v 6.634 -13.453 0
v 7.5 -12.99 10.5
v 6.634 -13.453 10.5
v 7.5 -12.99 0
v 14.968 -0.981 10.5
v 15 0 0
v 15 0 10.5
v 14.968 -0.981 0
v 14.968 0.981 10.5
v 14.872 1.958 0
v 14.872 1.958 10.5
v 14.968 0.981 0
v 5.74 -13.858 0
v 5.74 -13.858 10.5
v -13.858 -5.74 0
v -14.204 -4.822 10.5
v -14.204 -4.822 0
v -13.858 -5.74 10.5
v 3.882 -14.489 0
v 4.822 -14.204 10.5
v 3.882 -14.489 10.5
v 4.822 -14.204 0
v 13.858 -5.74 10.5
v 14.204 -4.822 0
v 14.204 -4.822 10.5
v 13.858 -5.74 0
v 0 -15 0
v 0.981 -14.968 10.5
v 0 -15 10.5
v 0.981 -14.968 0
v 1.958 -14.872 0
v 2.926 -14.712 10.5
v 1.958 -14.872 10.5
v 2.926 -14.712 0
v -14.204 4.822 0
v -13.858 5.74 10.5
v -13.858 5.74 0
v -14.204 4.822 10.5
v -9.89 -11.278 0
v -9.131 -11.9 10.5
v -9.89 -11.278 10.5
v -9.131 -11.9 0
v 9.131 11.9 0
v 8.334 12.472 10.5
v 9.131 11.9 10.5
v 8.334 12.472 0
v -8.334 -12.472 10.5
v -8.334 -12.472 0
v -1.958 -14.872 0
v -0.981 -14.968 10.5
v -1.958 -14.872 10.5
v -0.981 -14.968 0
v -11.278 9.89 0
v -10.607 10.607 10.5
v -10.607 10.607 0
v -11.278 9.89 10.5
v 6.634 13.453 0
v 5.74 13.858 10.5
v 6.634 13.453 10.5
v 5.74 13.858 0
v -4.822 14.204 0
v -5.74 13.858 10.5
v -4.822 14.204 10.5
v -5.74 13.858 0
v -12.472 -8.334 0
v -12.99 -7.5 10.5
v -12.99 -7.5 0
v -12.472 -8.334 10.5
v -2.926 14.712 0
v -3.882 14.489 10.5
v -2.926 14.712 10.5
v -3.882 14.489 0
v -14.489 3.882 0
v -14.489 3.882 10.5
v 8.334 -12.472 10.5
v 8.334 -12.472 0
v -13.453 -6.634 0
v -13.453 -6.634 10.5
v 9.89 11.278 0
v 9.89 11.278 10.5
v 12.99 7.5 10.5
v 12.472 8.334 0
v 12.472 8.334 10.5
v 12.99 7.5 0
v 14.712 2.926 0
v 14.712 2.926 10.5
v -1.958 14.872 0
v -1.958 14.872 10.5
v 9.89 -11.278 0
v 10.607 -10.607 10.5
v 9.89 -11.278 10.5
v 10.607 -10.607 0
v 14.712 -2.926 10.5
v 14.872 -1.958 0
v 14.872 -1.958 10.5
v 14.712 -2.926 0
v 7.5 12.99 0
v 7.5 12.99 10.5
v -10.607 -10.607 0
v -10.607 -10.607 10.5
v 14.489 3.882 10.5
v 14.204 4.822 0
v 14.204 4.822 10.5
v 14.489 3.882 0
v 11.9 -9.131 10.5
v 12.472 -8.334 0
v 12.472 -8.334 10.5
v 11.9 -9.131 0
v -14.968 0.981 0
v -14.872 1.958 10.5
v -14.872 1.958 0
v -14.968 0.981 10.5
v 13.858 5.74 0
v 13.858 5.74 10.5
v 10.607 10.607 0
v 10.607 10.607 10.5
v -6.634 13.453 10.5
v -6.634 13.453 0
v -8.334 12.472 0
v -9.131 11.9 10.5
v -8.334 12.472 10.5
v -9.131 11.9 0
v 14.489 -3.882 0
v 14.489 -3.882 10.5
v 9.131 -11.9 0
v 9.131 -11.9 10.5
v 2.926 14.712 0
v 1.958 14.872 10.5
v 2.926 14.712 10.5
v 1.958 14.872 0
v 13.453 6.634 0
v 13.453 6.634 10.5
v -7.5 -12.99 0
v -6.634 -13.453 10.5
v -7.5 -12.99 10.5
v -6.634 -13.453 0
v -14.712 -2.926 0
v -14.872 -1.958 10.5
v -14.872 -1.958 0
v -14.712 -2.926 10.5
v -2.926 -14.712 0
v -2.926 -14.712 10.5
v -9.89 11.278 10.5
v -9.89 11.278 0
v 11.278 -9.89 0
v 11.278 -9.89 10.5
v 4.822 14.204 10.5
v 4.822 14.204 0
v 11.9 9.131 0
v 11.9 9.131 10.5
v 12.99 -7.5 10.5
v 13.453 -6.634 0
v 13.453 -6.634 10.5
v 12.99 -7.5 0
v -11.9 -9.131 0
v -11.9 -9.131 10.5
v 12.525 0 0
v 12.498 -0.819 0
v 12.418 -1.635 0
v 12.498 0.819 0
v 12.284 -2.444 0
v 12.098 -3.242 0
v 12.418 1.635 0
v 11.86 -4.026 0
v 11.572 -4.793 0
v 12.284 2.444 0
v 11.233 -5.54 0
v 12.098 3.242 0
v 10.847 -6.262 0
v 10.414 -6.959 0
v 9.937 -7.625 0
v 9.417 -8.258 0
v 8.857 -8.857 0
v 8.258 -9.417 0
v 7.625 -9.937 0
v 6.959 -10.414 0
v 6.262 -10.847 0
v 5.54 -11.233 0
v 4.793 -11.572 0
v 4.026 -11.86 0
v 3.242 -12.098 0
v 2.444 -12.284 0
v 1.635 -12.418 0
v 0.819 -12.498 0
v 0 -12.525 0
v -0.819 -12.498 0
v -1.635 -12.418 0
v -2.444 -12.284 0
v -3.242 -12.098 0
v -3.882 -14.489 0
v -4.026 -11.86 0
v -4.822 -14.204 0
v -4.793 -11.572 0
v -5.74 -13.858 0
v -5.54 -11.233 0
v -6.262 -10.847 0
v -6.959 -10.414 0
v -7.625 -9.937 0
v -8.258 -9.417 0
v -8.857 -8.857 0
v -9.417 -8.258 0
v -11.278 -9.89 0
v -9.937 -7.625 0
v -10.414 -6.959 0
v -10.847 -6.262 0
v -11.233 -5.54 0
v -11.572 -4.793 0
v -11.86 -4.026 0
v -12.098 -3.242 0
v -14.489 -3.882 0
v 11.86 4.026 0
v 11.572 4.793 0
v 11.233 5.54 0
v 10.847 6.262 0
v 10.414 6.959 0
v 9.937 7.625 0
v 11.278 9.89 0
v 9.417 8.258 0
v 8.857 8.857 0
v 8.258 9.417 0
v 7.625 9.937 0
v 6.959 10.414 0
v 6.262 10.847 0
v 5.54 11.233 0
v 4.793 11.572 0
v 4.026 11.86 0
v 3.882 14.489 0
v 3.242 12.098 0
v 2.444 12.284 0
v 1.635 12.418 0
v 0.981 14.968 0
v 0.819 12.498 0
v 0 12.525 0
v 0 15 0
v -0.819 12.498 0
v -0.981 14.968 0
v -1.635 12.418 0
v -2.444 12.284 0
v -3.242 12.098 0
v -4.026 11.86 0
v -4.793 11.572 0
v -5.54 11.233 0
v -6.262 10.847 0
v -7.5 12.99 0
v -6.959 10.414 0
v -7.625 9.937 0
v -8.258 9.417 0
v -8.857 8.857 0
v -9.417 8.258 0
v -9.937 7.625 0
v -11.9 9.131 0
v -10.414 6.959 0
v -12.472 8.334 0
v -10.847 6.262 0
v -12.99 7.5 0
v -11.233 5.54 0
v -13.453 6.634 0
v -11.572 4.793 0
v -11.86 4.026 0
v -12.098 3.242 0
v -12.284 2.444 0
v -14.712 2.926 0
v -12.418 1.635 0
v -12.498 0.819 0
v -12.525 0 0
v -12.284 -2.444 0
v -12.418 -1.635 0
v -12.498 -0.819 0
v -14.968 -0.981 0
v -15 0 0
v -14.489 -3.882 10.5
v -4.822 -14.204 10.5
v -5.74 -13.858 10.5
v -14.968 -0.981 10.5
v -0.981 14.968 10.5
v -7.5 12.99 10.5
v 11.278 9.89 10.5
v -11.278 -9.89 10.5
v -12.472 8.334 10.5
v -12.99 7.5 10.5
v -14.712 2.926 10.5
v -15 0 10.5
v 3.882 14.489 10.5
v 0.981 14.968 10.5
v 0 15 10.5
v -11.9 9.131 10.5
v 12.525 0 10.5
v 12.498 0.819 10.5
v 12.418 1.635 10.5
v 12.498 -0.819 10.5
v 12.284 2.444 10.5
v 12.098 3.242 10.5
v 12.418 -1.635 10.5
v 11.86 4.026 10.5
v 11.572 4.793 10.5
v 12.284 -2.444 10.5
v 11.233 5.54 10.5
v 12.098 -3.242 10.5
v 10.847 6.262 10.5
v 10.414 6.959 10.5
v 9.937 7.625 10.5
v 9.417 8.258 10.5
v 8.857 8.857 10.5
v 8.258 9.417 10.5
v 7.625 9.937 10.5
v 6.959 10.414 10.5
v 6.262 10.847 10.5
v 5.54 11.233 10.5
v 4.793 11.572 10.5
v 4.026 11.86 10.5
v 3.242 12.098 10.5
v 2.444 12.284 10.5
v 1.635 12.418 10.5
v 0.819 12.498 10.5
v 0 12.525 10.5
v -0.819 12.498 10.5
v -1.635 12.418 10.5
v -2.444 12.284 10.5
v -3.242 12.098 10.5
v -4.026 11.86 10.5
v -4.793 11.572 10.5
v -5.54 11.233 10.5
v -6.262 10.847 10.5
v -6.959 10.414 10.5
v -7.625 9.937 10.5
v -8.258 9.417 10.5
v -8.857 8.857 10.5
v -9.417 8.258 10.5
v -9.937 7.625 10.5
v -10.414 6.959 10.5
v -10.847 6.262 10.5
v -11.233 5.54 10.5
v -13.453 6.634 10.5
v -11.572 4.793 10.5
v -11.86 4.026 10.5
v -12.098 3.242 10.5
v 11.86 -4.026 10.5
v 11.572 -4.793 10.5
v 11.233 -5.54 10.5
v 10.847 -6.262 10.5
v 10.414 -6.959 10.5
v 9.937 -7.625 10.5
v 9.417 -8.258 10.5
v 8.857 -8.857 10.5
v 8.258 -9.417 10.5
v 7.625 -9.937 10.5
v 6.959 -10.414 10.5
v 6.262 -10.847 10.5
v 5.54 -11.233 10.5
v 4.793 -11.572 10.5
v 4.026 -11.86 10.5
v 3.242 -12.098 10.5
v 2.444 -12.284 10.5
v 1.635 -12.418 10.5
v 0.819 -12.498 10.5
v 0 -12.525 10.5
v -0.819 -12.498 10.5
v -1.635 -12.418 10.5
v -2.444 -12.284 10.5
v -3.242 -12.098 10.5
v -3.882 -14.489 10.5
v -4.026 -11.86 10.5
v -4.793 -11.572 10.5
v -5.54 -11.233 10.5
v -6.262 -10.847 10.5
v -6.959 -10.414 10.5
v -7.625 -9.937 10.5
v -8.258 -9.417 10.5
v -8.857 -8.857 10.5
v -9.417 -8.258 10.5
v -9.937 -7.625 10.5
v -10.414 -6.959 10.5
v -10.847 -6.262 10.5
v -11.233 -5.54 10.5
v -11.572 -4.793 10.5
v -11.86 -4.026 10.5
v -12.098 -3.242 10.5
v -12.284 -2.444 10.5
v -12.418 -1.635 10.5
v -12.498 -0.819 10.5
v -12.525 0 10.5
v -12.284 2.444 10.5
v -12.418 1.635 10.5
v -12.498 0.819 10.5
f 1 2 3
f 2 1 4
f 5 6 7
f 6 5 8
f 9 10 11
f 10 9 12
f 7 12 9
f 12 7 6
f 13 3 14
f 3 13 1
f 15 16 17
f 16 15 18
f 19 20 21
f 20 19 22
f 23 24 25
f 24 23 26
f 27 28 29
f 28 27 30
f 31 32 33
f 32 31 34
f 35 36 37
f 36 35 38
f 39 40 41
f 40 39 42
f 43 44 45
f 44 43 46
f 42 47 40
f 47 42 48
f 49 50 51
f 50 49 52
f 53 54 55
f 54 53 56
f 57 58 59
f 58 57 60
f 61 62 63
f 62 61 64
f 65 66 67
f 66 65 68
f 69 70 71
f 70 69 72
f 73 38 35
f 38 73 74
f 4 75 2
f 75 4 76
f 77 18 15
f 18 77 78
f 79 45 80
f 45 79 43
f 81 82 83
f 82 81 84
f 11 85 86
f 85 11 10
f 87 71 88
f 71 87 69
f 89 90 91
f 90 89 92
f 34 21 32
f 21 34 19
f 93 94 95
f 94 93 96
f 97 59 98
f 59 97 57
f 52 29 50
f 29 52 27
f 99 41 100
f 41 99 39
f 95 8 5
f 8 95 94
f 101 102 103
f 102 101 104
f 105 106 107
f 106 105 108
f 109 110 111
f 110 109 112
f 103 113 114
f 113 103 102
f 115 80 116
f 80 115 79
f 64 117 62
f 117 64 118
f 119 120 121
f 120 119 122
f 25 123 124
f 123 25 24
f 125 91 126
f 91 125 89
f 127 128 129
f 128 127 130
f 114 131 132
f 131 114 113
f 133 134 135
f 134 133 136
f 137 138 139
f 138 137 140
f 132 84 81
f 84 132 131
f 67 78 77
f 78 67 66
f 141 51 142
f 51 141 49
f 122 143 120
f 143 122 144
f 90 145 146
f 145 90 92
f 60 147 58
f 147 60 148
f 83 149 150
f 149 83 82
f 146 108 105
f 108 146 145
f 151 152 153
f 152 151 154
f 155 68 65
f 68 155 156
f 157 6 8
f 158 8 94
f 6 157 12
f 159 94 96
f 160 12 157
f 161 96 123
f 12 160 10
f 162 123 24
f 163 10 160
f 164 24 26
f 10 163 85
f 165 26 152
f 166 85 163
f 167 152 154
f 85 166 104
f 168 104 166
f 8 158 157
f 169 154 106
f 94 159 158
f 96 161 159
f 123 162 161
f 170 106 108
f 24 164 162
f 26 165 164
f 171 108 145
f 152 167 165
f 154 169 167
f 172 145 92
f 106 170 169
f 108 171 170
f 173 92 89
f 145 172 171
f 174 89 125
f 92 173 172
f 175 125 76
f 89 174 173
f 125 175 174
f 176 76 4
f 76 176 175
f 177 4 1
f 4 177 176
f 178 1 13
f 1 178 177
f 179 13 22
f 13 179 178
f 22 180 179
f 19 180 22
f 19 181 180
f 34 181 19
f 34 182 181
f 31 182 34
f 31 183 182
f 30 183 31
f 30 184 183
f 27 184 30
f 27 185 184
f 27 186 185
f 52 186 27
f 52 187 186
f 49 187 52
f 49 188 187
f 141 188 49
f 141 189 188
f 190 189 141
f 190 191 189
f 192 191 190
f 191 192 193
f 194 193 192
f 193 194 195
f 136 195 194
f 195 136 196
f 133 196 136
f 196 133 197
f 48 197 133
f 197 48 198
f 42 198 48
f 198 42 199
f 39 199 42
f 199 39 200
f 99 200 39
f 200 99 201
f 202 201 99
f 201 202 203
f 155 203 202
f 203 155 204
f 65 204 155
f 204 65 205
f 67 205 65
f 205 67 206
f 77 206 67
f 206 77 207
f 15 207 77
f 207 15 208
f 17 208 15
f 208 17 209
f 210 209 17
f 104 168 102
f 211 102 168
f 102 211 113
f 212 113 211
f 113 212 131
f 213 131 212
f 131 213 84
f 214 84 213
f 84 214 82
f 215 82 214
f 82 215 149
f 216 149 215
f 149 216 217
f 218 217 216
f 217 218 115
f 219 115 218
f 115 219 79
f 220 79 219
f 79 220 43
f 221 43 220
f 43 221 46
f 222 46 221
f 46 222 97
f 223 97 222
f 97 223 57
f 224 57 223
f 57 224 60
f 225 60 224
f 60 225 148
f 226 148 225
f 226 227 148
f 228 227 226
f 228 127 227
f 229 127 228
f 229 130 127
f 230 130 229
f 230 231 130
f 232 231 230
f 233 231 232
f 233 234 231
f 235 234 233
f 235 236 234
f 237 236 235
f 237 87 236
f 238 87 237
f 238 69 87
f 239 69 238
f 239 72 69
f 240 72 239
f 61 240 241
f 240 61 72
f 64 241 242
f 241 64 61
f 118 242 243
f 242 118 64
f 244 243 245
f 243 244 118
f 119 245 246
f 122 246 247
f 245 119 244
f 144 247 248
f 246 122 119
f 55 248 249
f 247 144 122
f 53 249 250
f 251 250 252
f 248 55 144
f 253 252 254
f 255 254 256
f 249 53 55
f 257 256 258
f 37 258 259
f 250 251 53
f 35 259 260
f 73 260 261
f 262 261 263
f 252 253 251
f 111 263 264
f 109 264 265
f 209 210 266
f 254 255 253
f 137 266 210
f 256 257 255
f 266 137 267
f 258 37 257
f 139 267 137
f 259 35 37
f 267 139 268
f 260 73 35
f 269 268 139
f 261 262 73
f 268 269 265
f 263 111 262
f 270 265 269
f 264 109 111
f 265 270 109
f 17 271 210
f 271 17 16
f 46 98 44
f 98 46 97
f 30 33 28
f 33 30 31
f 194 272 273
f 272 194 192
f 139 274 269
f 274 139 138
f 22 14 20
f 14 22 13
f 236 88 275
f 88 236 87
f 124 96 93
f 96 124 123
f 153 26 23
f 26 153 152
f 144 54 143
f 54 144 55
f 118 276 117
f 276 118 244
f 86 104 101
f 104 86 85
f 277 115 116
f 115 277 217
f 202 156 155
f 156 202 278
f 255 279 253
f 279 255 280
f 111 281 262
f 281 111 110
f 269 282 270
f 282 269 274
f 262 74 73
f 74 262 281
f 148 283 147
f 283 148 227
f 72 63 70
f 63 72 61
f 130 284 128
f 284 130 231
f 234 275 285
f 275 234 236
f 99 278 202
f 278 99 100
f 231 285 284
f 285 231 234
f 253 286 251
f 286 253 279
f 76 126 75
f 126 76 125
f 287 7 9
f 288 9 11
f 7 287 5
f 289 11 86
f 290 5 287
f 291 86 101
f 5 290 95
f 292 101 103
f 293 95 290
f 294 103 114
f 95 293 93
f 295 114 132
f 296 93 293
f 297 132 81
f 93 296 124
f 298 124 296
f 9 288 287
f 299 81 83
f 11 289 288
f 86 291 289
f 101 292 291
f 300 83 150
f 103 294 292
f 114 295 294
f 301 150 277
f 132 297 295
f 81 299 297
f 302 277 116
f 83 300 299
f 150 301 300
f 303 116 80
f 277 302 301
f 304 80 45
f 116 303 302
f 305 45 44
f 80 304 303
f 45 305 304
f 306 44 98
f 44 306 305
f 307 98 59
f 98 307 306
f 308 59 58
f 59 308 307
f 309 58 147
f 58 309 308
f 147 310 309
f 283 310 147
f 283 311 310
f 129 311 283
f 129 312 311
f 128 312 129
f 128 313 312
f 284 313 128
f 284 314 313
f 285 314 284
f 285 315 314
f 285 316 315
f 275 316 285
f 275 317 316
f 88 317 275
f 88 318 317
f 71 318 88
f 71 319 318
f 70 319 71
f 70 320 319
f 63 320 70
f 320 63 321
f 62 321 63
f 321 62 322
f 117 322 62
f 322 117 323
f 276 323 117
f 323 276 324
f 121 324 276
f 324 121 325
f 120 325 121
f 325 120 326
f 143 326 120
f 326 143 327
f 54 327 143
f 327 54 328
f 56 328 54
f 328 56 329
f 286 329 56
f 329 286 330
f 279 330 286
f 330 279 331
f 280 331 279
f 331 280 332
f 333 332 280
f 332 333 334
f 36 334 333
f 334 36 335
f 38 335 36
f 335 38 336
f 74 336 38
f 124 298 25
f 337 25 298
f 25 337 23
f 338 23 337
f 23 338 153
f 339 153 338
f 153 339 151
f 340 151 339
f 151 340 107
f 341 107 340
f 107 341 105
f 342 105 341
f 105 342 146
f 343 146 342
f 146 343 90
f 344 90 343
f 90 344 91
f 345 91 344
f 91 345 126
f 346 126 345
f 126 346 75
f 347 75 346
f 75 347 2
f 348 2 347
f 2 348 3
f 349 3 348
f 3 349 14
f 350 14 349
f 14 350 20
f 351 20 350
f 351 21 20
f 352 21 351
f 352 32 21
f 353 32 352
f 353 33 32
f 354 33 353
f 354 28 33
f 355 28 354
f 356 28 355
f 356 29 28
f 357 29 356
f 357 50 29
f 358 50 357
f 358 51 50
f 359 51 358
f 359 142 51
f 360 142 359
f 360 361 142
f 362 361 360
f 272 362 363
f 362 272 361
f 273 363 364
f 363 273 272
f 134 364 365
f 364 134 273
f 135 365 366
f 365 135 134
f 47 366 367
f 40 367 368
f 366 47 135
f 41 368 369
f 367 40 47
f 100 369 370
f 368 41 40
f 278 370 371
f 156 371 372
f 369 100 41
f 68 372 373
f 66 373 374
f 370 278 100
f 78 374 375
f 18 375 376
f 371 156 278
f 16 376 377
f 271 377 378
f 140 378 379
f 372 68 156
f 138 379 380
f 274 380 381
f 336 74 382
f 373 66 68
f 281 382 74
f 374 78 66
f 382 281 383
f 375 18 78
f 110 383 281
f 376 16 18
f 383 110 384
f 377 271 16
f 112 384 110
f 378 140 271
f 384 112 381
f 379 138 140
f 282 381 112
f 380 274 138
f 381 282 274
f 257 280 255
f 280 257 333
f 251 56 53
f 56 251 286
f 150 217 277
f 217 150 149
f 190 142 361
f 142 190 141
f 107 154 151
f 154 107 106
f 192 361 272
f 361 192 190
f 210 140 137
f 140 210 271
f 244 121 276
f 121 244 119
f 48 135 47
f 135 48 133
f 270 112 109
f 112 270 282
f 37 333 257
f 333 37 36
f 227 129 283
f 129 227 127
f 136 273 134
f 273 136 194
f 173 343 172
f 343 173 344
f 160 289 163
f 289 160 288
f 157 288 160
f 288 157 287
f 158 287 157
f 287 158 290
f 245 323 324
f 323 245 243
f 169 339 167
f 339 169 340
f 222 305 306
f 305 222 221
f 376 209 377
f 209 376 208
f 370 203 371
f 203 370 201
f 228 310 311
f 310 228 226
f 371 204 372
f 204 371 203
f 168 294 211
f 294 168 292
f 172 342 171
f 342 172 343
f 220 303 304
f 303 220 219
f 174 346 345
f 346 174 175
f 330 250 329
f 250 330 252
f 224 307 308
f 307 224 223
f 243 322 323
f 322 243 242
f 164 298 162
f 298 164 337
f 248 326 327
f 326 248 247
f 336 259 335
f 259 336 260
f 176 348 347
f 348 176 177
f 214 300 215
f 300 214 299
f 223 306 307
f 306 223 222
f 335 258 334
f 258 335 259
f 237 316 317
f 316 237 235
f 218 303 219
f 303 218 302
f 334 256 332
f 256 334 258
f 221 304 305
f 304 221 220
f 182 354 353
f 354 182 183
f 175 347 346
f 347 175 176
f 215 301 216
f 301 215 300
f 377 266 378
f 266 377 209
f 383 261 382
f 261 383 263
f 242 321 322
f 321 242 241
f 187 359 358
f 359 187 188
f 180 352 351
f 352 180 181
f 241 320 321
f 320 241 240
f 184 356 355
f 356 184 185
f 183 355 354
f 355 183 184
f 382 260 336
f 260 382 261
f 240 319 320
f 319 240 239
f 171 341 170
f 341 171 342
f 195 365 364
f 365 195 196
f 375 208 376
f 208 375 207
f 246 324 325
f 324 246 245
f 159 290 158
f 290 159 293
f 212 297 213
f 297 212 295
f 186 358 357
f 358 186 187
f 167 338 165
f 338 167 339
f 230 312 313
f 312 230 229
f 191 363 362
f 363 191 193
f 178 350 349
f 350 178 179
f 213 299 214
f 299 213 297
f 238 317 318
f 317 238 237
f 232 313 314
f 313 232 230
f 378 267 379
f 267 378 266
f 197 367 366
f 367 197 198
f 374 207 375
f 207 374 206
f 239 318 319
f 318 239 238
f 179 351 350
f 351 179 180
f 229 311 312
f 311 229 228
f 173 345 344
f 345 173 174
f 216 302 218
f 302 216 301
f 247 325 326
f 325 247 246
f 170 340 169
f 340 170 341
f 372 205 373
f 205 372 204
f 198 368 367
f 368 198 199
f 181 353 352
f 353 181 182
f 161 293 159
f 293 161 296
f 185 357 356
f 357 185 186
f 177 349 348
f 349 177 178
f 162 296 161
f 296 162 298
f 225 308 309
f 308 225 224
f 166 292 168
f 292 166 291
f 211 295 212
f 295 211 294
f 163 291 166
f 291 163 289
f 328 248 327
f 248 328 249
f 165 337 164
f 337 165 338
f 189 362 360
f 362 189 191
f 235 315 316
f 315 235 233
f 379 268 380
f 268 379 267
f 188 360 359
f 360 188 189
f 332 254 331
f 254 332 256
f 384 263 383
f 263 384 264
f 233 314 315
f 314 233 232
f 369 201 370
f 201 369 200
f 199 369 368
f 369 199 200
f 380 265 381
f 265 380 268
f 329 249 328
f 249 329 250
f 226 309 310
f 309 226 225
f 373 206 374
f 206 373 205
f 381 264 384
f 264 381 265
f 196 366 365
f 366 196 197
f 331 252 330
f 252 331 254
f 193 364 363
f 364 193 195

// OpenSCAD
// file: params.scad
// GENERATED by design/build.py from design/params.py -- do not edit by hand.

C = 60.0;
N_SLOTS = 16.0;
T_BLADE = 8.0;
SIDE_CLEAR = 0.2;
T_SPACER = 8.4;
END_CLEAR = 0.5;
R_TIP = 34.0;
R_ROOT = 25.0;
TEETH = 3.0;
STAGGER_DEG = 15.0;
BLADE_VARIANTS = 4.0;
SPACER_OD = 50.0;
SPACER_BORE = 29.2;
HEX_AF = 25.05;
HEX_BORE_AF = 25.1;
HEX_RELIEF_D = 3.2;
JOURNAL_D = 25.0;
PLATE_H = 70.0;
PLATE_L = 170.0;
LAYER_T = 10.0;
INNER_HOLE_D = 36.0;
CAP_HOLE_D = 32.0;
SEAL_BORE_DEPTH = 7.0;
CAP_BORE_DEPTH = 7.0;
COLLAR_OD = 46.0;
COLLAR_T = 4.0;
SLEEVE_OD = 30.0;
SLEEVE_ID = 25.05;
COMB_W = 25.0;
COMB_GAP = 0.5;
COMB_SLOT_CLEAR = 0.5;
COMB_SLOT_PAST_TIP = 3.0;
COMB_SCREW_Y = 74.0;
WALL_H = 50.0;
WALL_GAP = 2.0;
END_WASHER_T = 10.0;
END_SCREW_LEN = 30.0;
PRINTER_X = 250.0;
PRINTER_Y = 210.0;
PRINTER_Z = 210.0;
PRINT_WALL = 3.0;
PRINT_FLANGE = 4.0;
HOPPER_TOP_Z = 305.0;
HOPPER_TOP_IN = 180.0;
HOPPER_SPLIT_Z = 105.0;
TOP_HOLE_Y = 10.0;
TOP_HOLE_DEPTH = 10.0;
WALL_TOP_HOLE_X = 30.0;
WALL_TOP_HOLE_Y = 71.0;
GUARD_HOLE_Y = 80.0;
GUARD_HOLE_Z = 9.0;
GUARD_CLEAR = 3.0;
BASE_T = 18.0;
WORM_AXIS_DROP = 63.0;
GROUND_Z = -368.0;
MOTOR_SHAFT_L = 40.0;
TL_B_CLEAR = 5.0;
HANDLE_W = 110.0;
HANDLE_H = 40.0;
HANDLE_BACK_T = 8.0;
HANDLE_LIP_D = 26.0;
HANDLE_Z = -200.0;
HANDLE_SCREW_DX = 35.0;
HANDLE_HOLE_D = 4.5;
INSERT_D = 5.6;
INSERT_DEPTH = 6.0;
DRF_GAP = 1.0;
SW_PAD_L = 92.0;
SW_PAD_W = 32.0;
SW_PAD_T = 10.0;
SW_SCREW_SPACING = 22.0;
INTERLOCK_IN = 12.0;
INTERLOCK_OUT_TRAVEL = 15.0;
CG_END_GAP = 1.0;
CG_FOOT_W = 36.0;
CG_FOOT_T = 4.0;
CG_FOOT_REACH = 16.0;
DECK_PLY_T = 18.0;
DECK_MARGIN = 30.0;
LEG_SECTION = 45.0;
STUB_D = 25.0;
STUB_L = 80.0;
STUB_END_D = 30.0;
STUB_END_L = 60.0;
STUB_FLAT_AF = 22.0;
STUB_FLAT_L = 40.0;
STUB_KEY_L = 70.0;
T_LIMIT = 63.25;
HOOK_DEG = 10.0;
TEST_PIN_D = 12.0;
TEST_PIN_R = 32.0;
TEST_PIN_PROJ = 9.0;
TEST_BLADE_GAP = 1.0;
TEST_LEVER_L = 540.0;
TEST_LEVER_W = 50.0;
TEST_LEVER_T = 10.0;
TEST_LEVER_PIVOT_END = 25.0;
TEST_LEVER_PIVOT_D = 25.2;
TEST_WEIGHT_ARM = 500.0;
TEST_WEIGHT_HOLE_D = 10.5;
TEST_WEIGHT_KG = 11.9;
TEST_BLADE_ROT = -30.0;
TEST_LEVER_DEG = 0.0;
T_SET = 55.0;
T_OPERATING = 45.0;
TL_SET_AT_TL = 55.0;
SUBPLATE_T = 20.0;
GB_BOX = [100.0, 100.0, 145.0];
GB_BELOW_OUT = 113.0;
GB_BOSS = 9.0;
GB_FOOT = [124.0, 76.0];
GB_FLANGE = [140.0, 100.0, 8.0];
GB_WORM_STUB = 40.0;
SPROCKET_T = 7.2;
SPROCKET_OD_EXTRA = 6.2;
SPROCKET_ROOT = 7.92;
CHAIN_ENV_W = 18.0;
CHAIN_ENV_H = 12.1;
DRIVE_LEG_MIN = 60.0;
PIN_N = 4.0;
PIN_D = 8.0;
PIN_L = 32.0;
PIN_R = 50.5;
PIN_HOLE_D = 8.5;
PF_D = 120.0;
PF_T = 12.0;
PF_GAP = 2.0;
PF_HUB_D = 50.0;
PF_POCKET_D = 36.0;
PF_POCKET_CLEAR = 2.0;
PF_KEY_L = 25.0;
PF_SHAFT_RECESS = 1.0;
DG_SEAM_Z = 0.0;
DG_FLANGE_W = 12.0;
DG_FLANGE_T = 4.0;
TLFIX_ARM = 500.0;
TLFIX_LEVER_L = 600.0;
TLFIX_LEVER_W = 50.0;
TLFIX_LEVER_T = 10.0;
TL_HUB_D = 42.0;
TL_FLANGE_T = 8.0;
TL_CM_OFFSET = 12.0;
TL_GB_GAP = 3.0;
TL_PACK_D = 70.0;
TL_PRESS_T = 8.0;
TL_SPRING_L = 26.0;
GB_HUB_L = 72.0;
OUT_SPACER_D = 36.0;
SHAFT_KEY_W = 8.0;
SHAFT_KEY_D = 4.0;
GB_KEY_END = 6.0;
TL_KEY_END = 3.0;
CIRCLIP_GROOVE_D = 23.9;
CIRCLIP_GROOVE_W = 1.3;
CIRCLIP_T = 1.2;
CIRCLIP_OD = 31.4;
CIRCLIP_EDGE = 3.0;
GB_RAIL_W = 50.0;
GB_RAIL_T = 10.0;
GB_RAIL_SLOT = 6.0;
GB_RAIL_BOLT_DX = 86.0;
GB_RAIL_END = 10.0;
GB_SPACER_L = 18.0;
DECK_RAIL_MARGIN = 20.0;
DECK_ANCHOR_D = 8.0;
DECK_ANGLE = [40.0, 40.0, 4.0];
DECK_ANGLE_L = 44.0;
DECK_ANGLE_DECK_BOLTS = 2.0;
DECK_ANGLE_LEG_BOLTS = 2.0;
FOOT_ANGLE_LEG_BOLTS = 2.0;
FOOT_ANGLE_ANCHORS = 2.0;
BIG_WASHER_D = 24.0;
BIG_WASHER_T = 2.0;
DECK_LEG_INSET_Y = 45.0;
TLFIX_PIN_L = 25.0;
TLFIX_LEVER_GAP = 5.0;
TLFIX_PIVOT_D = 25.2;
TLFIX_LUG = [20.0, 20.0];
TLFIX_LUG_GAP = 2.4;
SW_BODY = [31.0, 30.0, 90.0];
SW_HOLE_SPACING = 22.0;
SW_SLOT = [5.0, 23.0, 20.0];
ACT_SIZE = [12.0, 20.0, 50.0];
ACT_BLADE_T = 3.0;
ACT_BLADE_L = 20.0;
ACT_HOLE_SPACING = 20.0;
PILOT_D = 3.3;
PILOT_DEPTH = 8.0;
HSW_BODY = [42.0, 38.0, 112.0];
HSW_HOLE_SPACING = 22.0;
HSW_SLOT = [6.0, 24.0, 25.0];
HACT_SIZE = [15.0, 20.0, 68.0];
HACT_BLADE_T = 3.0;
HACT_BLADE_L = 22.0;
HACT_HOLE_SPACING = 30.0;
HSW_SCREW = [4.0, 4.5, 7.0, 3.0, 3.3];
HACT_SCREW = [5.0, 5.5, 8.5, 3.5, 4.2];
HSW_PAD_W = 48.0;
SCREEN_GAP = 2.0;
SCREEN_T = 10.0;
SCREEN_HOLE_D = 5.0;
SCREEN_HOLE_PITCH = 8.0;
SCREEN_HOLE_SLOPE = 50.0;
SCREEN_RELIEF_D = 6.5;
SCREEN_END_GAP = 0.5;
SCREEN_SCREW = [4.0, 4.5, 7.0, 4.0, 8.5];
SCREEN_SCREW_Y = 74.0;
SCREEN_TAP_DEPTH = 9.0;
SCREEN_SCREW_LAND = 8.0;
SCREEN_POCKET = [11.0, 6.0];
WALL_SCREW_HEAD = [8.5, 5.0];
BASE_CUT_Y = 83.0;
CPL_D = 54.0;
CPL_hub_L = 20.6;
CPL_gap = 12.7;
BEARING_name = "NA4905 needle roller bearing with inner ring";
BEARING_d = 25.0;
BEARING_D = 42.0;
BEARING_B = 17.0;
BEARING_F = 30.0;
BEARING_C = 23700.0;
BEARING_C0 = 20500.0;
GEAR_module = 4.0;
GEAR_z = 15.0;
GEAR_alpha = 20.0;
GEAR_bore = 25.0;
GEAR_hub_L = 18.0;
GEAR_cut_extra = 0.1;
GEAR_FACE = 30.0;
GEAR_HUB_L = 18.0;
GEAR_HUB_D = 45.0;
GEAR_SPACER_D = 30.0;
GEAR_KEY_W = 8.0;
GEAR_KEYWAY_H = 3.3;
GEAR_KEY_TOOL_D = 0.4;
OB_T = 10.0;
OB_H = 100.0;
OB_ZC = 3.0;
OB_L = 180.0;
OB_GAP = 2.0;
OB_STEP = 1.5;
PILLAR = [15.0, 60.0];
PILLAR_Y0 = 73.0;
TIE_D = 8.0;
TIE_WASHERS = 3.0;
HOOD_SCREW_PTS = [[76.0, 28.0], [76.0, -28.0], [-76.0, 28.0], [-76.0, -28.0]];
SEAL_d = 30.0;
SEAL_D = 42.0;
SEAL_B = 7.0;
THRUST_d = 30.0;
THRUST_D = 47.0;
THRUST_T = 4.0;
CRINKLE_d = 30.0;
CRINKLE_D = 39.0;
CRINKLE_n = 3.0;
CRINKLE_stack_h = 2.0;
TL_z = 30.0;
TL_L = 62.0;
TL_D = 89.0;
TL_T_min = 34.0;
TL_T_max = 149.0;
CHAIN_pitch = 12.7;
DECK_ANCHOR = "M8";

// derived
blades_per_shaft = 8.0;
stack_A = 131.2;
end_spacer_B = 8.2;
stack_B = 131.0;
chamber_L = 132.2;
overlap = 8.0;
tip_to_spacer = 1.0;
hex_AC = 28.9252;
bore_AC = 28.983;
bearing_x_drive = -18.5;
bearing_x_free = 150.7;
bearing_span = 169.2;
sleeve_L_drive = 10.5;
sleeve_L_free_A = 10.5;
sleeve_L_free_B = 10.7;
x_inner_ring_out_drive = -27.0;
x_cap_out_drive = -30.0;
collar_body_L_drive = 7.0;
x_collar_in_drive = -34.0;
x_collar_out_drive = -38.0;
gear_face = 30.0;
x_gear_in = -38.0;
x_gear_out = -68.0;
x_gear_hub_out = -86.0;
x_ob_in = -88.0;
x_ob_out = -108.0;
x_ob_ring_in = -89.5;
x_ob_ring_out = -106.5;
bearing_x_ob = -98.0;
gear_spacer_L = 3.5;
x_sprocket_in = -110.0;
ob_sleeve_L = 3.5;
x_spA_in = -135.0;
x_sprocket_out = -197.0;
x_cm = -185.0;
a_end_hub_L = 62.0;
ob_sleeve_A_L = 28.5;
standoff_L = 58.0;
x_sprocket_c = -166.0;
x_inner_ring_out_free = 159.2;
x_cap_out_free = 162.2;
collar_body_L_free = 9.0;
x_collar_in_free = 168.2;
x_collar_out_free = 172.2;
shaft_end_free = 170.7;
shaft_end_A_drive = -195.5;
shaft_end_B_drive = -108.5;
shaft_A_len = 366.2;
shaft_B_len = 279.2;
tl_sprocket_pd = 121.498;
sprocket_A_pd = 121.498;
tl_sprocket_root_d = 113.578;
hex_x0 = 1.5;
hex_x1 = 130.7;
gear_pitch_d = 60.0;
gear_od = 68.0;
gear_root_d_std = 50.0;
gear_root_d = 49.8;
gear_cut_depth = 9.1;
comb_edge_y = 55.5;
comb_slot_w = 9.0;
comb_slot_bottom_y = 67.0;
wall_inner_y = 66.0;

// blade torque test lever: computed from the blade outline (design/build.py, test_lever_numbers)
test_pin_Rmin = 30.9995;
test_pin_s = 1.4836;
test_pin_psi = 10.1718;
test_pin_contact_r = 32.54;
test_pin_clear = 0.1807;
hook_face_len = 4.546;
hook_face_end_r = 29.5336;
test_pin_off = -10.8544;
test_pin_edge_steel = 8.1456;
test_pin_ring_steel = 13.4;
test_pin_F = 1976.5625;
test_pin_sigma = 58.2555;
test_pin_deg = -19.8282;
test_face_nrm_deg = 70.0;
// main file
// sleeve.scad -- clamp sleeves (OD 30 = SLEEVE_OD, also the oil-seal running surface) and the COLLARED sleeves (turned from the Ø55 bar).
// Part frame: axis along +Z from 0.  Collared sleeve: collar (OD COLLAR_OD x COLLAR_T) at z = 0, then the Ø30 body.
include <params.scad>

module tube(od, id, L) {
    $fn = 96;
    difference() {
        cylinder(d = od, h = L);
        translate([0, 0, -1]) cylinder(d = id, h = L + 2);
    }
}

module sleeve(L) tube(SLEEVE_OD, SLEEVE_ID, L);
// collar first (z 0 .. COLLAR_T), body after it
module collared(Lb) { tube(COLLAR_OD, SLEEVE_ID, COLLAR_T); translate([0, 0, COLLAR_T - 0.01]) tube(SLEEVE_OD, SLEEVE_ID, Lb + 0.01); }

// standalone render:  -D 'kind="drive"|"free_A"|"free_B"|"collar_drive"|"collar_free"|"gear_spacer"|"ob_sleeve"|"ob_sleeve_A"'
kind = "drive";
if (kind == "drive") sleeve(sleeve_L_drive);
else if (kind == "free_A") sleeve(sleeve_L_free_A);
else if (kind == "free_B") sleeve(sleeve_L_free_B);
else if (kind == "collar_drive") collared(collar_body_L_drive);
else if (kind == "gear_spacer") tube(GEAR_SPACER_D, SLEEVE_ID, gear_spacer_L);     // gear hub -> outboard bearing inner ring
else if (kind == "ob_sleeve") tube(GEAR_SPACER_D, SLEEVE_ID, ob_sleeve_L);         // outboard bearing inner ring -> end cap (B)
else if (kind == "ob_sleeve_A") tube(GEAR_SPACER_D, SLEEVE_ID, ob_sleeve_A_L);     // outboard bearing inner ring -> sprocket hub (A): longer, the 30T sprocket clears B's end
else collared(collar_body_L_free);
